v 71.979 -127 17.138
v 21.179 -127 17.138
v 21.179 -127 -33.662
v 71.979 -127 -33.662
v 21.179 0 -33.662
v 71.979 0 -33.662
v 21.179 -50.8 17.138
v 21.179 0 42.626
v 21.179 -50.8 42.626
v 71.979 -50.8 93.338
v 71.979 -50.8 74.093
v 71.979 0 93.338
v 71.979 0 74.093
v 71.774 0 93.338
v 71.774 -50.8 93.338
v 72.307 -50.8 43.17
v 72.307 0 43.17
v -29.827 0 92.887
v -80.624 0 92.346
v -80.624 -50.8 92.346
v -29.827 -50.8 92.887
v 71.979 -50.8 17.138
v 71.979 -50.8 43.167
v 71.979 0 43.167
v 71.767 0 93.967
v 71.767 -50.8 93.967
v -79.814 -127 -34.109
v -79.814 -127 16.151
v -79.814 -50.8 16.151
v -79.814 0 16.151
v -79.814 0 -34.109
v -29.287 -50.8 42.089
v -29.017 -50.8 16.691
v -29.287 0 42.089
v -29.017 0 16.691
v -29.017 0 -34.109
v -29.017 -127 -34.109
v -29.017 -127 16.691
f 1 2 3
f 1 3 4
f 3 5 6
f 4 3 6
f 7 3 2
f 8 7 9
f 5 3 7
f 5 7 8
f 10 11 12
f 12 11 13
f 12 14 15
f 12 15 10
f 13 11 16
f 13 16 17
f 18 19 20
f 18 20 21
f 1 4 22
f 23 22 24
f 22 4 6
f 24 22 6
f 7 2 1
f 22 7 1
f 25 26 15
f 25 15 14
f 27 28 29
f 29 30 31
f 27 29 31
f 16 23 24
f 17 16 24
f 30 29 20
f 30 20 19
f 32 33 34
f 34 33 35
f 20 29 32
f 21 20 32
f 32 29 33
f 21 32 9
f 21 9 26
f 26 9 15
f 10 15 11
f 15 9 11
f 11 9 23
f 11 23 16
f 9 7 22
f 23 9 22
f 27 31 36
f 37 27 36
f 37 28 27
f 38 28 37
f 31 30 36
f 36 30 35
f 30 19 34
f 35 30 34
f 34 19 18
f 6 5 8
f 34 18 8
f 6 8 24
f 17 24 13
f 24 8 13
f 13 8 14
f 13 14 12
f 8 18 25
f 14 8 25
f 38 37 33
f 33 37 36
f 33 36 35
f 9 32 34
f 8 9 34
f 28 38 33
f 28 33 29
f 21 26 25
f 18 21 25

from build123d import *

# Parameters (mm, degrees)
F1_DEPTH = 127
F0_W     = 50.8
F0_H     = 50.8
F2_DEPTH = 127
F3_W     = 50.8
F3_H     = 50.8
F4_DEPTH = 76.2
F5_W     = 50.8
F5_H     = 50.8
F6_DEPTH = 76.2
F7_W     = 50.8
F7_H     = 50.8
F8_DEPTH = 101.6


with BuildPart() as f1:
    # F0 (on Front) → F1 (new body)
    with BuildSketch(Plane.XZ):
        Polygon((-29.016551, 16.690897), (-79.813677, 16.150502), (-79.813677, -34.109103), (-29.016551, -34.109103), align=None)
    extrude(amount=F1_DEPTH)

    # F3 (on face) → F4 (join)
    with BuildSketch(Plane(origin=(-0.180826, 0, 16.99766), x_dir=(0.999943, 0, 0.010638), z_dir=(-0.010638, 0, 0.999943))):
        with Locations((-54.237357, -25.4)):
            Rectangle(F3_W, F3_H)
    extrude(amount=F4_DEPTH)



with BuildPart() as f2:
    # F0 (on Front) → F2 (new body)
    with BuildSketch(Plane.XZ):
        with Locations((46.57851, -8.262248)):
            Rectangle(F0_W, F0_H)
    extrude(amount=F2_DEPTH)

    # F5 (on face) → F6 (join)
    with BuildSketch(Plane.XY.offset(17.137752)):
        with Locations((46.57851, -25.4)):
            Rectangle(F5_W, F5_H)
    extrude(amount=F6_DEPTH)


with BuildPart() as f1_1:
    add(f1.part)

    add(f2.part)  # F8 merges F2
    # F7 (on face) → F8 (join)
    with BuildSketch(Plane(origin=(-28.835725, 0, -0.306763), x_dir=(0, 1, 0), z_dir=(0.999943, 0, 0.010638))):
        with Locations((-25.4, 67.798622)):
            Rectangle(F7_W, F7_H)
    extrude(amount=F8_DEPTH)


solid = f1_1.part
